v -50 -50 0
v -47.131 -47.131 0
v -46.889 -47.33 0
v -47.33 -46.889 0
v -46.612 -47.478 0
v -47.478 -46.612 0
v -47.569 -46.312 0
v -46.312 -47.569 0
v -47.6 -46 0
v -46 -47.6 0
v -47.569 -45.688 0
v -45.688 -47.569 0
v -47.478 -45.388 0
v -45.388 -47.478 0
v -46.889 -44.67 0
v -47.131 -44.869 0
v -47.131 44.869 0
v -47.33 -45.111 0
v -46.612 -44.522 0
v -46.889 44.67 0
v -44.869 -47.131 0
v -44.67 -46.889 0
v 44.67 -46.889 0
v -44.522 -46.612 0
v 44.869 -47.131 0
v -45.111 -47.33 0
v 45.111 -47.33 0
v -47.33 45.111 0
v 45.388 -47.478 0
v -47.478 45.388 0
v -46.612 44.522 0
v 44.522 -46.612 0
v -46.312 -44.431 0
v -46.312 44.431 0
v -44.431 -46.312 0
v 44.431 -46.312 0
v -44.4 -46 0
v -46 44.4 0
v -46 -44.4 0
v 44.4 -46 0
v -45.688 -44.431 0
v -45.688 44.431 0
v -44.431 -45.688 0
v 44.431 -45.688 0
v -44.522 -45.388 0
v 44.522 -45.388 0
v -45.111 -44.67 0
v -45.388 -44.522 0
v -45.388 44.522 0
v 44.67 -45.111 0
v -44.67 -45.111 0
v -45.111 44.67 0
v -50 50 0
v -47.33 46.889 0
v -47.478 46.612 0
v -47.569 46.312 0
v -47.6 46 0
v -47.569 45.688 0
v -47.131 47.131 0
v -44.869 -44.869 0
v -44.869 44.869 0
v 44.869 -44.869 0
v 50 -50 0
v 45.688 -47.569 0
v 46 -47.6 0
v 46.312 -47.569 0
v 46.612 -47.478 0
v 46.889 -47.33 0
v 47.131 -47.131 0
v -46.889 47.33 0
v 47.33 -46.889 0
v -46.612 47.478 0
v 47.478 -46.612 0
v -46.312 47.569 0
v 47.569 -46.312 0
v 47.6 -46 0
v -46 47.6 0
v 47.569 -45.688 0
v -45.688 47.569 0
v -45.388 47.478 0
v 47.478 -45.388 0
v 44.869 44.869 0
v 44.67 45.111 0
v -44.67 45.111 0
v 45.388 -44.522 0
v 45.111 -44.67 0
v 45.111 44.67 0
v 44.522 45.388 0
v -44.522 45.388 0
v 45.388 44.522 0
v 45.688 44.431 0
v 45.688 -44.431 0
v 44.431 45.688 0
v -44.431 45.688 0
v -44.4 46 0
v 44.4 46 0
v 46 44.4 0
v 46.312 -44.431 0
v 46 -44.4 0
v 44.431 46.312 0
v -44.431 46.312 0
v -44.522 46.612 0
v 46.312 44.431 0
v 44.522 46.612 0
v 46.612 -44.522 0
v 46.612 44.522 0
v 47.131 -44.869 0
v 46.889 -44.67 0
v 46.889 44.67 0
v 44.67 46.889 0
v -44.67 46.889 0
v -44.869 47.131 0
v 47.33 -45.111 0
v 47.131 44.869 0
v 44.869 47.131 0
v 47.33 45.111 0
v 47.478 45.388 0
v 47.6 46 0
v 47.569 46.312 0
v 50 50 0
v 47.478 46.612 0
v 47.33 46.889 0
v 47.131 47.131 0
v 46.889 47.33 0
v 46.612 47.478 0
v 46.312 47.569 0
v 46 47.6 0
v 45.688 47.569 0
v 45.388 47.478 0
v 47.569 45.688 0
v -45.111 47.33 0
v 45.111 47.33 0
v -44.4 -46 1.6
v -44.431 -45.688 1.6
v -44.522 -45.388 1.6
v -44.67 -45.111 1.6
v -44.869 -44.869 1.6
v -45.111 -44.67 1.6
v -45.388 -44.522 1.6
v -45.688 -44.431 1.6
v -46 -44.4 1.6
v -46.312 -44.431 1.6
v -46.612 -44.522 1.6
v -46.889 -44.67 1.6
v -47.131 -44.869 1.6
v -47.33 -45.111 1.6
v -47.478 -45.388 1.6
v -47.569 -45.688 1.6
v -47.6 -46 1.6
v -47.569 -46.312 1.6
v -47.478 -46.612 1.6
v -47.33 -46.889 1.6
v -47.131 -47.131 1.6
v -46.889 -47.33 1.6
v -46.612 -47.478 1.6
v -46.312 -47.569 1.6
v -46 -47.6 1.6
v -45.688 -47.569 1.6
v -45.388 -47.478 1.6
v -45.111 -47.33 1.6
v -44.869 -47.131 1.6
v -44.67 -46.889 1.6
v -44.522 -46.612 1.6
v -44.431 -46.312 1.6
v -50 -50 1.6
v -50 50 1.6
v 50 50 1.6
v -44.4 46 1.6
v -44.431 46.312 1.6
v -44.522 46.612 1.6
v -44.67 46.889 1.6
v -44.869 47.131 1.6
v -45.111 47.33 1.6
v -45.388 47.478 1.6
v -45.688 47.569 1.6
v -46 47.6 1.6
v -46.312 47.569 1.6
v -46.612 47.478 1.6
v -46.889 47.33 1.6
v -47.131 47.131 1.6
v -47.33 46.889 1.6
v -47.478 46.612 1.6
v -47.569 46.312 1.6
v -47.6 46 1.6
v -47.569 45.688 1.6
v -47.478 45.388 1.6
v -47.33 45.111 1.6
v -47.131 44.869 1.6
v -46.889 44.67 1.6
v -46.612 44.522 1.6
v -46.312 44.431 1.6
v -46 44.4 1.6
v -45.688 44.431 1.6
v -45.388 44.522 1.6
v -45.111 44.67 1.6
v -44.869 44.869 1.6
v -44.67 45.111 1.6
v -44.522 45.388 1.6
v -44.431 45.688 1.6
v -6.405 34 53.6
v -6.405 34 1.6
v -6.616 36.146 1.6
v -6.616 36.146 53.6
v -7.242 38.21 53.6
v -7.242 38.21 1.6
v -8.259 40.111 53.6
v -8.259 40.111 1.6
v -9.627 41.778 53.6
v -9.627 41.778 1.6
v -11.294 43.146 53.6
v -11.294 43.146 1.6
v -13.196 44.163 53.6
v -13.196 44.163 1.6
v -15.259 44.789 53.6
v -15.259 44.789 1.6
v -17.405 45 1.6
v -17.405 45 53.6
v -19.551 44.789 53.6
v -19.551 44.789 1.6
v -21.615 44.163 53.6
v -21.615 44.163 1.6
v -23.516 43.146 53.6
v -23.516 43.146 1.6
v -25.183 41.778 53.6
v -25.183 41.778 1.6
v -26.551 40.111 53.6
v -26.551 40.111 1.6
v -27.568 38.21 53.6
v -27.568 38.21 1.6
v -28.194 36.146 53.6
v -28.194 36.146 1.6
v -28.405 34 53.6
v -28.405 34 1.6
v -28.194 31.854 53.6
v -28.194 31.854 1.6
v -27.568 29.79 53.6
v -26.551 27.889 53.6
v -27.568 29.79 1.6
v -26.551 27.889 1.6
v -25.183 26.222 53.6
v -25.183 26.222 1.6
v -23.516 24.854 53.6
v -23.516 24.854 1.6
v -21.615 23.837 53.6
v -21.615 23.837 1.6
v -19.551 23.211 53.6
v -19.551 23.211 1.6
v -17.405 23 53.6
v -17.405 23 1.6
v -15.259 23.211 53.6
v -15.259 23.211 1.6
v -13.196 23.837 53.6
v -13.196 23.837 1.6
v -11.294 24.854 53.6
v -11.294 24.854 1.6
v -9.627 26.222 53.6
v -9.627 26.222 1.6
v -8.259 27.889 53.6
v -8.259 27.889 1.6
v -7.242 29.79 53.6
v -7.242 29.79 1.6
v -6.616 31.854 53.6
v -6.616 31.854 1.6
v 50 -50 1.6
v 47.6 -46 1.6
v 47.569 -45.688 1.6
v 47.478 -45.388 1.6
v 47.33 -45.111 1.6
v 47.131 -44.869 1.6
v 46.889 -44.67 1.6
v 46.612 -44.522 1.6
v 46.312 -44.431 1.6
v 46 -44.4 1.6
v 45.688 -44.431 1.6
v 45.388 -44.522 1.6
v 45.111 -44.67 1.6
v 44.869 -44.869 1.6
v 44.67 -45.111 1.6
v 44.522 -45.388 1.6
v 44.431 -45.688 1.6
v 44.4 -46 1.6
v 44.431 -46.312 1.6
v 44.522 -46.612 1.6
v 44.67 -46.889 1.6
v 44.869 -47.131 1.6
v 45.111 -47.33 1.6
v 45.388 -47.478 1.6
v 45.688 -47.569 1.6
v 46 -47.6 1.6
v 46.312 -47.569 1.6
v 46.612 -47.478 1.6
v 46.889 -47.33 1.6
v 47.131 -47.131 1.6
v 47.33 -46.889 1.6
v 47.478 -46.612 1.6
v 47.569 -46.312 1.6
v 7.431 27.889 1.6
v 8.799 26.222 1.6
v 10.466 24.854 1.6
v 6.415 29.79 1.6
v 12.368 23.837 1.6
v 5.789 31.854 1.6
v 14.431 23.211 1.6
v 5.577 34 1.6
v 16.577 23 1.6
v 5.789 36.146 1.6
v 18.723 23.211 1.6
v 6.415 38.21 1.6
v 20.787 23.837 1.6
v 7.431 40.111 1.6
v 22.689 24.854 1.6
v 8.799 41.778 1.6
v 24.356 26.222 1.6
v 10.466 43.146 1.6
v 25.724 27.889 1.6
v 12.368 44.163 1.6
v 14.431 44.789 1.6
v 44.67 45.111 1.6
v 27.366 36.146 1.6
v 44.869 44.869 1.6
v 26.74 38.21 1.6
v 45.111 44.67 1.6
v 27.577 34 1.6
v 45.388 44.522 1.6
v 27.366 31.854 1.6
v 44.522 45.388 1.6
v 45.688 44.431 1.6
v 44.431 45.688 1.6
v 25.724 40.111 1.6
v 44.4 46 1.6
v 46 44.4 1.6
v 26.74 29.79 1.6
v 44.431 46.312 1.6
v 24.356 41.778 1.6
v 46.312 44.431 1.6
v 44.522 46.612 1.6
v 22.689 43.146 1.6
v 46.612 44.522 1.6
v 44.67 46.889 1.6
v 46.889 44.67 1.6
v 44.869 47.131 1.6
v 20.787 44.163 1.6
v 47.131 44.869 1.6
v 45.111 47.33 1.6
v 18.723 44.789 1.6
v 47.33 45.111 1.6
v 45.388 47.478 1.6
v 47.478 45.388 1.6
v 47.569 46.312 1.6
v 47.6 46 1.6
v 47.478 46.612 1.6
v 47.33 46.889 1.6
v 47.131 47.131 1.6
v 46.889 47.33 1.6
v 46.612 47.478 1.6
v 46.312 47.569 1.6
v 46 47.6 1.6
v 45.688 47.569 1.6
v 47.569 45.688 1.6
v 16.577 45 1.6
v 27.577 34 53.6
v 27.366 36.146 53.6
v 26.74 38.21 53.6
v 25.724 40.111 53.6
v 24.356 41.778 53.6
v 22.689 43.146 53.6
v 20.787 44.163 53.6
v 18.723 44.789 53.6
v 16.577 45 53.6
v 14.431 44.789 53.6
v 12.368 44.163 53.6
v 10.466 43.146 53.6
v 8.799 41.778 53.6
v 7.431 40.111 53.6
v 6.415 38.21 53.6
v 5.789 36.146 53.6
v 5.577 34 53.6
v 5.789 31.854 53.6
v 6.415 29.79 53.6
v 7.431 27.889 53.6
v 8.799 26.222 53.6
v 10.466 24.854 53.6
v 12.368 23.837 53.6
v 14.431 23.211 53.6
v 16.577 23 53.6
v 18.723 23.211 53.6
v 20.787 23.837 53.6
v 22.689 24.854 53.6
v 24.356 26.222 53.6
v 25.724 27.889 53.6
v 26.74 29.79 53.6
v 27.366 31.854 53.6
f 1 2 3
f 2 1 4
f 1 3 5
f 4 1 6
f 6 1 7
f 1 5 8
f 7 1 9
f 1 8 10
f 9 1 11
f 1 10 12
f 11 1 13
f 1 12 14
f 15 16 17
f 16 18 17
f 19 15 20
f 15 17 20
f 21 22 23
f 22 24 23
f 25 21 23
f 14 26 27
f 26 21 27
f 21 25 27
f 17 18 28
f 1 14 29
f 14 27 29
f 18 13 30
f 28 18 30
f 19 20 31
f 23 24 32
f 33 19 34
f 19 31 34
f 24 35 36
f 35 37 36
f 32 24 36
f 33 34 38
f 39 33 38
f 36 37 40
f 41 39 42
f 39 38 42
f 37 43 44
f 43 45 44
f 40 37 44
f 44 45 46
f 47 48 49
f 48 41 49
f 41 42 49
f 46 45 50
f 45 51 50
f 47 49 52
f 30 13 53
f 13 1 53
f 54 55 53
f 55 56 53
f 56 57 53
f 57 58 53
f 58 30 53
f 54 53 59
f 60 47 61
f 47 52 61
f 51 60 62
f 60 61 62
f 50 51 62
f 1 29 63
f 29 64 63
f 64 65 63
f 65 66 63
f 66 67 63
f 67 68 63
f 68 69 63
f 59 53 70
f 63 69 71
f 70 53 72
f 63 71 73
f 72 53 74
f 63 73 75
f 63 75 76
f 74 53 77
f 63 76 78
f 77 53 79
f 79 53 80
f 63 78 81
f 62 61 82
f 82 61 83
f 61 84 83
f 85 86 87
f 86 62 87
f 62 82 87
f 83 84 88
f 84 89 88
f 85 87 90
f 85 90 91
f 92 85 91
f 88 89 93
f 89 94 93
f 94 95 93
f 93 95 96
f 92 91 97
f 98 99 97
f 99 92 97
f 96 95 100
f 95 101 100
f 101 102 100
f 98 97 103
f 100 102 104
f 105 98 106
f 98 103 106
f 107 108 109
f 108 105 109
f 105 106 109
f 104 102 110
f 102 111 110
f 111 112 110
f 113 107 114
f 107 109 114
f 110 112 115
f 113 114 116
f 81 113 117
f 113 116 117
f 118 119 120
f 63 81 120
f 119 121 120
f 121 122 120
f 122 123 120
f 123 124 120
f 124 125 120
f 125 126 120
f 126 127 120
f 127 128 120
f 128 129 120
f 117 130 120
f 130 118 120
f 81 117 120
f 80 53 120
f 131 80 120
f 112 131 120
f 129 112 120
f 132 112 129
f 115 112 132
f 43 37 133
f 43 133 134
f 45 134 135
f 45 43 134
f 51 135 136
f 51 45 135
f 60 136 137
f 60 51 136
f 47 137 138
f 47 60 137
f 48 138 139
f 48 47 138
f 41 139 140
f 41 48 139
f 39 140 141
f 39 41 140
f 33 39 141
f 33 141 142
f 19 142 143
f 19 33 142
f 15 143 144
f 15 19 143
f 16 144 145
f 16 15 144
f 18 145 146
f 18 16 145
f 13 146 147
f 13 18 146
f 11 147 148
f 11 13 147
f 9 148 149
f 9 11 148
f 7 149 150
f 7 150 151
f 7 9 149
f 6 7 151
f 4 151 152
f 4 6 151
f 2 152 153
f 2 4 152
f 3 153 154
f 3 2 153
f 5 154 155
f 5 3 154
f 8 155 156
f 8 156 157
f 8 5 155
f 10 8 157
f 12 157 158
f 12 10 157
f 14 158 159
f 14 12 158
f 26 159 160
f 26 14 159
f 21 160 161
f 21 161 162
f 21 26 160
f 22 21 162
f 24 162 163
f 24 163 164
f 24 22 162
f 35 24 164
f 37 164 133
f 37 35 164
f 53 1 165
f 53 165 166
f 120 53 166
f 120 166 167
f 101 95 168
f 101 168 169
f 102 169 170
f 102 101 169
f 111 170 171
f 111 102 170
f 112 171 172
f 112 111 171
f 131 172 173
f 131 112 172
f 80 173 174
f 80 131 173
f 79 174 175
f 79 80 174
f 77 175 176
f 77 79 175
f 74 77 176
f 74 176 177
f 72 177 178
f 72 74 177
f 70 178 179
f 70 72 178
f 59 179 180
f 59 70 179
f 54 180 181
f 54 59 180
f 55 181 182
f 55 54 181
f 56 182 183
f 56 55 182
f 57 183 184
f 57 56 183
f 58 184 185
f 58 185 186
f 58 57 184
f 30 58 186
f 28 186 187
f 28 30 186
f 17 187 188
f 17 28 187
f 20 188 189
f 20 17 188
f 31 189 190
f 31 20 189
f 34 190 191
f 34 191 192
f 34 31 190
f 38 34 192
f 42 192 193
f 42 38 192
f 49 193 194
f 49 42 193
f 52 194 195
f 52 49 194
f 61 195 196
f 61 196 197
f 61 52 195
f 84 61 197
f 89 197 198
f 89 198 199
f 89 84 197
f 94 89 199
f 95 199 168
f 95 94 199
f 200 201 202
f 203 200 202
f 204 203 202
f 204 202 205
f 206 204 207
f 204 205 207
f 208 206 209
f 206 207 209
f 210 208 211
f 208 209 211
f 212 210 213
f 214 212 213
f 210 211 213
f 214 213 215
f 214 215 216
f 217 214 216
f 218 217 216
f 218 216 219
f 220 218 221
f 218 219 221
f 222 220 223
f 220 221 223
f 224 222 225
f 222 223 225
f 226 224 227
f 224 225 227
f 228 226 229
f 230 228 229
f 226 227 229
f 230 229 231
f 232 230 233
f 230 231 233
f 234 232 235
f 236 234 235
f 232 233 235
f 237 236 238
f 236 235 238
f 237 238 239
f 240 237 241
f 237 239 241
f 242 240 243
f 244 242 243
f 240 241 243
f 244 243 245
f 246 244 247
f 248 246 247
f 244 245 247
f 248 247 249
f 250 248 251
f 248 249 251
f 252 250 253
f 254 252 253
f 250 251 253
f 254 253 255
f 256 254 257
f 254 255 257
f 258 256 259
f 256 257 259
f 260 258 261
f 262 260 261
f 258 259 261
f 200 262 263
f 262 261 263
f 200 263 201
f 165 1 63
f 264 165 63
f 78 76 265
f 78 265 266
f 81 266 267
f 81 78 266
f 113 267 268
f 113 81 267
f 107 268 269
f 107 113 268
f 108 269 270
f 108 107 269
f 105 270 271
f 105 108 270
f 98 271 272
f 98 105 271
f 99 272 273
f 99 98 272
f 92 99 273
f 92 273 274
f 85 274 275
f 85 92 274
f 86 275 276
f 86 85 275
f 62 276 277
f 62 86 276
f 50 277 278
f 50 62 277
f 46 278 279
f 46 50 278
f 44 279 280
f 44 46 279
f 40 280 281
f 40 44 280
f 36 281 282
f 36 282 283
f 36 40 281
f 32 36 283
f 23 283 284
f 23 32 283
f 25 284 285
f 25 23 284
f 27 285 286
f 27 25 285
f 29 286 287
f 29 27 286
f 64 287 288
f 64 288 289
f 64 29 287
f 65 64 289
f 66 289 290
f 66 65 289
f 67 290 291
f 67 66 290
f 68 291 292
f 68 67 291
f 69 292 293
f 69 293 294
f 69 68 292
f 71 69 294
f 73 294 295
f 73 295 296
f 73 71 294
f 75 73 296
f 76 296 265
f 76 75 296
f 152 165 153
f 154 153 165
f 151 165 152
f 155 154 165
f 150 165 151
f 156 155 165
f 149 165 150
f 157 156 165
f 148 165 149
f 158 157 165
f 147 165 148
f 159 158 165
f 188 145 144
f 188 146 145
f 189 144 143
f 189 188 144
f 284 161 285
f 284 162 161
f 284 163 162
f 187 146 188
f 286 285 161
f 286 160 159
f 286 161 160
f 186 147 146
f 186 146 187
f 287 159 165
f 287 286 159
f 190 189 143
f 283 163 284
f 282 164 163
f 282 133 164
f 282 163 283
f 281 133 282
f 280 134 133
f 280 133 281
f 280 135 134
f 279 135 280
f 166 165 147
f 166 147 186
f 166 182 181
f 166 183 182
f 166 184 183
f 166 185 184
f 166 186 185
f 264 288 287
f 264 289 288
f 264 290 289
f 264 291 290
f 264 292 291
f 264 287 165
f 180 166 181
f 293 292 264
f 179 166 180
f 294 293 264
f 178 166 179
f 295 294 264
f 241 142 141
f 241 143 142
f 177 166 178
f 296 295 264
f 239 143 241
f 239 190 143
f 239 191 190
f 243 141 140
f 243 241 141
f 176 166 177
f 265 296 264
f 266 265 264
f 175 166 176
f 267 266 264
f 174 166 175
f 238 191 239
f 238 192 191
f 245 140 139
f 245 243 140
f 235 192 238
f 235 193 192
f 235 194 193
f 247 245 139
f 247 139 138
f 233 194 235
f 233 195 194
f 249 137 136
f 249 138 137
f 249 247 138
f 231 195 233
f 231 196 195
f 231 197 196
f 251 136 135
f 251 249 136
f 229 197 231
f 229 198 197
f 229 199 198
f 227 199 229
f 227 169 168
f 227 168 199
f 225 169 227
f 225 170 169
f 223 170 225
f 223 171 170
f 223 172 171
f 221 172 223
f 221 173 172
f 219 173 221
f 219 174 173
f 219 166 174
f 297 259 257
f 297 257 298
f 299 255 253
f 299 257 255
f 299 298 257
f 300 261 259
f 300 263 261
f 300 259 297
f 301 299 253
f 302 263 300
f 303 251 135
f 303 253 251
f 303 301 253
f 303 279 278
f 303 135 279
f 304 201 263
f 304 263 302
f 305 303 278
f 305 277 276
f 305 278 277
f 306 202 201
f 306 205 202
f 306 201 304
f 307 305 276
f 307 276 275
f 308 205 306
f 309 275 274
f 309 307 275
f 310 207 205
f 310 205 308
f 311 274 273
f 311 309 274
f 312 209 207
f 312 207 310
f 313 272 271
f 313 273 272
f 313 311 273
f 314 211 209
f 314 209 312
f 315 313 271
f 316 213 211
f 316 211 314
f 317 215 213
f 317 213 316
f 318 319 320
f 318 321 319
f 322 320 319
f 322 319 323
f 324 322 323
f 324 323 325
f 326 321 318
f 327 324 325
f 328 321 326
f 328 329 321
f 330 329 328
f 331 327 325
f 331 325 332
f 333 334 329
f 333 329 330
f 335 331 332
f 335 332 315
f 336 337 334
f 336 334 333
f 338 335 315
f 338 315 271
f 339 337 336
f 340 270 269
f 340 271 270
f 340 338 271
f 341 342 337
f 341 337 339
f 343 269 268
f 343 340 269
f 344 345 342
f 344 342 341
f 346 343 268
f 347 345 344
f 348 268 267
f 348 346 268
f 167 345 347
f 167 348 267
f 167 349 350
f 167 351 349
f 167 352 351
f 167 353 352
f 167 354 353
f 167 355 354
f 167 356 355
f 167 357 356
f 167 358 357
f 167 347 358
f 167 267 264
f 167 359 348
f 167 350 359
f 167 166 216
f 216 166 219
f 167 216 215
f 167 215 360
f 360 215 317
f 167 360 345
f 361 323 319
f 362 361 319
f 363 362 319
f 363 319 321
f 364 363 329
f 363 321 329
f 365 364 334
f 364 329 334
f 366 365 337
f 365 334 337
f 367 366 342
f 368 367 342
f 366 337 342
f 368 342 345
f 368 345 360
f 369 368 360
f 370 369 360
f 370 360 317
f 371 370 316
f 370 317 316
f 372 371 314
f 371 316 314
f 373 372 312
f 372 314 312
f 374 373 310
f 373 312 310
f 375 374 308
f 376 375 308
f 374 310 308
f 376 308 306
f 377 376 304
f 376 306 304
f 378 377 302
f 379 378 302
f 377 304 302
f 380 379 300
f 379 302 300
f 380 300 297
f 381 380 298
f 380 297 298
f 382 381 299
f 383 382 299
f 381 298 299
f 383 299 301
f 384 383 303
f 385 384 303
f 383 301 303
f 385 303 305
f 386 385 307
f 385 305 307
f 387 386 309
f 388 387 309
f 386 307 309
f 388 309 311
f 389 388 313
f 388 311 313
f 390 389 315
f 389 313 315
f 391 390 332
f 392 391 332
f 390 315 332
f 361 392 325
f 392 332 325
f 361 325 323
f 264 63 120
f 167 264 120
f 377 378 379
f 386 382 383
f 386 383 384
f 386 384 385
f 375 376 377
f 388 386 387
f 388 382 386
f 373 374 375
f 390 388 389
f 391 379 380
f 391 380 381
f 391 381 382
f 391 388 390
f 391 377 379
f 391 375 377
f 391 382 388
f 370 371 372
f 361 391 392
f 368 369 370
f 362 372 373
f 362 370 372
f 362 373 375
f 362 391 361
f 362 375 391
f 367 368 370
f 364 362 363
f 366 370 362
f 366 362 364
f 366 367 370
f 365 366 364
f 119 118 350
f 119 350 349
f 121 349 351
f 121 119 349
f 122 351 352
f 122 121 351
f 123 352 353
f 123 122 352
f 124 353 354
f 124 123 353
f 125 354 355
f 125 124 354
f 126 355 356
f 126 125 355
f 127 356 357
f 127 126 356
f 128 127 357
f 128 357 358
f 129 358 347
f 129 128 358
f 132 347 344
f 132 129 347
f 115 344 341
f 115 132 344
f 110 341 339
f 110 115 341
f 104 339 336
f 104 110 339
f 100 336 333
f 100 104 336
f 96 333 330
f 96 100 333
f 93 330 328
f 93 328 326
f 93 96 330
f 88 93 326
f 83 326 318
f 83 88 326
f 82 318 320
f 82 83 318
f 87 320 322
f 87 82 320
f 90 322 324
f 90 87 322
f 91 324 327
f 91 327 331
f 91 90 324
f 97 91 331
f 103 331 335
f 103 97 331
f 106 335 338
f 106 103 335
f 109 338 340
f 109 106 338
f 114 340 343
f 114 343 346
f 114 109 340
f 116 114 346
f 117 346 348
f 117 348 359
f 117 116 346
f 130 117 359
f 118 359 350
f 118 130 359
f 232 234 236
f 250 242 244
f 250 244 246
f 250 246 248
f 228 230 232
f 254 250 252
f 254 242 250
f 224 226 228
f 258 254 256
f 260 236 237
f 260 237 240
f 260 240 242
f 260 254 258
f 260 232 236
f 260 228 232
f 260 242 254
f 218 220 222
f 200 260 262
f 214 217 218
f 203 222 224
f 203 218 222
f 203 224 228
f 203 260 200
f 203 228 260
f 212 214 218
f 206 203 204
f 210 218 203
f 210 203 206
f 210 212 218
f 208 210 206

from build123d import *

# Parameters (mm, degrees)
ESQUISSE1_W        = 100
ESQUISSE1_H        = 100
ESQUISSE1_R        = 1.6
BOSS_EXTRU_1_DEPTH = 1.6
ESQUISSE2_R        = 11
BOSS_EXTRU_2_DEPTH = 52


with BuildPart() as part:
    # Esquisse1 → Boss.-Extru.1 (new body)
    with BuildSketch(Plane.XY):
        Rectangle(ESQUISSE1_W, ESQUISSE1_H)
        with Locations((-46, 46)):
            Circle(ESQUISSE1_R, mode=Mode.SUBTRACT)
        with Locations((46, 46)):
            Circle(ESQUISSE1_R, mode=Mode.SUBTRACT)
        with Locations((-46, -46)):
            Circle(ESQUISSE1_R, mode=Mode.SUBTRACT)
        with Locations((46, -46)):
            Circle(ESQUISSE1_R, mode=Mode.SUBTRACT)
    extrude(amount=BOSS_EXTRU_1_DEPTH)

    # Esquisse2 → Boss.-Extru.2 (add)
    with BuildSketch(Plane.XY.offset(1.6)):
        with Locations((-17.405055541, 34)):
            Circle(ESQUISSE2_R)
        with Locations((16.577398103, 34)):
            Circle(ESQUISSE2_R)
    extrude(amount=BOSS_EXTRU_2_DEPTH)


solid = part.part
